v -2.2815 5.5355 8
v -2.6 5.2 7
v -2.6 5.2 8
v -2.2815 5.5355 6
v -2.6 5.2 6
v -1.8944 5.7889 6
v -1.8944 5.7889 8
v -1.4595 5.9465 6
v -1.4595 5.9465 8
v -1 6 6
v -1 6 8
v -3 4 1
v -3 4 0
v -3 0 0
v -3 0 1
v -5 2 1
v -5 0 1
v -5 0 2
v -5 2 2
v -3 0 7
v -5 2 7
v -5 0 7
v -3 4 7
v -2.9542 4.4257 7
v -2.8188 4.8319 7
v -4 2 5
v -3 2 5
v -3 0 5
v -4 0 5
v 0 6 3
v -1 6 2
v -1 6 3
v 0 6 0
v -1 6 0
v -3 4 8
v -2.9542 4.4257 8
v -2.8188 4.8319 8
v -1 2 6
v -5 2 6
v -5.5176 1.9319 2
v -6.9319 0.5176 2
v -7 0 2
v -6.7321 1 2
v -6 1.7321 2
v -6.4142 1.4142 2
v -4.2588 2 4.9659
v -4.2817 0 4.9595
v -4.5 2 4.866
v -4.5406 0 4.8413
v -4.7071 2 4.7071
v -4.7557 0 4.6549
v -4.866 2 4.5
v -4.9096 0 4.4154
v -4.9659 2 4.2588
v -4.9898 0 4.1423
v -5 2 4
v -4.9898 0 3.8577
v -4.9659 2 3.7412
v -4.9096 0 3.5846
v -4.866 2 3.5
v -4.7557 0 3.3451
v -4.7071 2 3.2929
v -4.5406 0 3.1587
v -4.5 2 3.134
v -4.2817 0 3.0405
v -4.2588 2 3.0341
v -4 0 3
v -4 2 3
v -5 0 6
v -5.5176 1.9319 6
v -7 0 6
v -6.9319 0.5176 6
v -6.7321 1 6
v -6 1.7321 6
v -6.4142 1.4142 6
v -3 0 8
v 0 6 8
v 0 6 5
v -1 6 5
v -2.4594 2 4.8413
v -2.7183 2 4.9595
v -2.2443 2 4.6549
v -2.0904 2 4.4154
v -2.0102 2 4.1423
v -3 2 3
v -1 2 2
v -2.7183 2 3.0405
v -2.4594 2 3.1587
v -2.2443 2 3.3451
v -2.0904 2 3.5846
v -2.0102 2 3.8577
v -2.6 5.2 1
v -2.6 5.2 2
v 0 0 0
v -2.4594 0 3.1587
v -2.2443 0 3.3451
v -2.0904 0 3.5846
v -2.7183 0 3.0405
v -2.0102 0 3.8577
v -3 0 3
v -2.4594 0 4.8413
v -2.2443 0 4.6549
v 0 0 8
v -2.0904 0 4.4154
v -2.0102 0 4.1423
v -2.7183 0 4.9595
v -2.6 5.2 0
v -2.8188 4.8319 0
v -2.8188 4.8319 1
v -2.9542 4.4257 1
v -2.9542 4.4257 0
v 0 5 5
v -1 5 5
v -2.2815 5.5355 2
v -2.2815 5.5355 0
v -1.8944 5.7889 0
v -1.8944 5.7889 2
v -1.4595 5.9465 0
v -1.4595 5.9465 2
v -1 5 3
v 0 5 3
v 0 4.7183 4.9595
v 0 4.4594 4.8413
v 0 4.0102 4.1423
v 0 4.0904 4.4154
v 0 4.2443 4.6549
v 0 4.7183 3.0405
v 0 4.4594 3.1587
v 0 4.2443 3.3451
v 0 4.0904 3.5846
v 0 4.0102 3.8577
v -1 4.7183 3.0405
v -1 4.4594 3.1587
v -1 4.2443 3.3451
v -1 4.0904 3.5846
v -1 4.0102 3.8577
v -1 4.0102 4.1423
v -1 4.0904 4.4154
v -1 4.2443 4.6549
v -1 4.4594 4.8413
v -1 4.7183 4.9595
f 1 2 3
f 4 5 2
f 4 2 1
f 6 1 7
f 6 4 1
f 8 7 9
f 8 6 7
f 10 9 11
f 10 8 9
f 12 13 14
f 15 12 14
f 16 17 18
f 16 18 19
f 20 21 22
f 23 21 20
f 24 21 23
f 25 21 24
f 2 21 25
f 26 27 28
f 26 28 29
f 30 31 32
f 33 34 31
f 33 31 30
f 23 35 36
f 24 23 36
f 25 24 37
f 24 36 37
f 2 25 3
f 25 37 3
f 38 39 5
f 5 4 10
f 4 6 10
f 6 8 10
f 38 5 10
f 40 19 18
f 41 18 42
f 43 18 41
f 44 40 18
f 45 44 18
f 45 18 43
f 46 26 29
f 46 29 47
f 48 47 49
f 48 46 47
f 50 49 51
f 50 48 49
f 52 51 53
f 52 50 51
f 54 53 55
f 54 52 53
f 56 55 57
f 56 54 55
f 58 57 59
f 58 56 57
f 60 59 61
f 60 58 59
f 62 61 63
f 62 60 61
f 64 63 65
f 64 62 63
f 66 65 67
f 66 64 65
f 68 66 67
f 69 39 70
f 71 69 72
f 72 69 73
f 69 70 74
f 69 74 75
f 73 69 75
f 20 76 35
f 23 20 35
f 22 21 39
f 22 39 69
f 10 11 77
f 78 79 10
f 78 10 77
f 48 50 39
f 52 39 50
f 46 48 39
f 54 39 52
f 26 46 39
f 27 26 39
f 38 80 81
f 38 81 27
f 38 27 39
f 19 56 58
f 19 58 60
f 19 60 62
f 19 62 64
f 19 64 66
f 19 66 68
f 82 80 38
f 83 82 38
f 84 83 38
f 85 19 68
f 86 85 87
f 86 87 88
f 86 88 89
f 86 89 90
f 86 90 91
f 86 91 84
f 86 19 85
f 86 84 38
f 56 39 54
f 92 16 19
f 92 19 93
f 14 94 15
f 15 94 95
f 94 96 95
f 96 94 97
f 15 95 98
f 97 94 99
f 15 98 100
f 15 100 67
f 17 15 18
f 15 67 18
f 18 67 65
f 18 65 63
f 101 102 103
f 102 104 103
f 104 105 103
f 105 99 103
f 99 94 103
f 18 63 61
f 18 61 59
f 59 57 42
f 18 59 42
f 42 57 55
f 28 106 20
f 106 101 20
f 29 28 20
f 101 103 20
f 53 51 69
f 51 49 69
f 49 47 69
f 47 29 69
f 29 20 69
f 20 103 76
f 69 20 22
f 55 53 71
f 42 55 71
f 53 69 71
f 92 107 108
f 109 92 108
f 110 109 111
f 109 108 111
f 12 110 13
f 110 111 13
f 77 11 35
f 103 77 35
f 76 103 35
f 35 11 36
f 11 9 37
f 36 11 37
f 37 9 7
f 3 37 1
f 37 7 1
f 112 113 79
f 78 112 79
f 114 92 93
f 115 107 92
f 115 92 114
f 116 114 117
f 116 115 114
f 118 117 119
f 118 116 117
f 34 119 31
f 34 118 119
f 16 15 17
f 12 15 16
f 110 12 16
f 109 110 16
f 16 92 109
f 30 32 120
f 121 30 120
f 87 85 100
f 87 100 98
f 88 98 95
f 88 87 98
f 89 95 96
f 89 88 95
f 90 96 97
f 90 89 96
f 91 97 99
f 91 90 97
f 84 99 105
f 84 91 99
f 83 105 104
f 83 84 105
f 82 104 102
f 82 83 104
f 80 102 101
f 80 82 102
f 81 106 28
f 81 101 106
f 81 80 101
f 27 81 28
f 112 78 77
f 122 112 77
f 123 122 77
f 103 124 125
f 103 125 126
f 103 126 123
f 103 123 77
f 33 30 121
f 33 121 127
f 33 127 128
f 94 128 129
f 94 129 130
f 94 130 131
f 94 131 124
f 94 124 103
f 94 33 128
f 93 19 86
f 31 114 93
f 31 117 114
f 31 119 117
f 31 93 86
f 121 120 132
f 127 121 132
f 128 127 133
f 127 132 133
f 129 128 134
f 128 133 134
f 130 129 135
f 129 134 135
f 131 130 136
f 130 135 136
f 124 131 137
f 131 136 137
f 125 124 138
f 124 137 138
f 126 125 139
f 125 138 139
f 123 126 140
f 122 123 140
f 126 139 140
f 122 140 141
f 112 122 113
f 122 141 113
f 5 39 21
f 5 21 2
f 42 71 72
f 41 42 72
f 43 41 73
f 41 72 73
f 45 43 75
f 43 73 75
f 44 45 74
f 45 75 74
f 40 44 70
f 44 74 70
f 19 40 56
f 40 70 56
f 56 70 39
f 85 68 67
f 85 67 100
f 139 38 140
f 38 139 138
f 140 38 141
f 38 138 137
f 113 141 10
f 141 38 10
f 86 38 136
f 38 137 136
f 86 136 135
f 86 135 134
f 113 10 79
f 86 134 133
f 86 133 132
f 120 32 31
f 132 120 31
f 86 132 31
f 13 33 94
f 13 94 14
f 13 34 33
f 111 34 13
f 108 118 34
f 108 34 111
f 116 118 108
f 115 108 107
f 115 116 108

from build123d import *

# Parameters (mm, degrees)
BOSS_EXTRUDE1_DEPTH = 8
SKETCH2_W           = 4
SKETCH2_H           = 4
CUT_EXTRUDE1_DEPTH  = 4
CUT_EXTRUDE2_DEPTH  = 2
BOSS_EXTRUDE2_DEPTH = 6
CUT_EXTRUDE4_DEPTH  = 2
CUT_EXTRUDE5_DEPTH  = 3
CUT_EXTRUDE8_DEPTH  = 1
CUT_EXTRUDE9_DEPTH  = 1


with BuildPart() as part:
    # Sketch1 → Boss-Extrude1 (new body)
    with BuildSketch(Plane.XY):
        with BuildLine():
            Line((0, 0), (-3, 0))
            Line((-3, 0), (-5, 0))
            Line((-5, 0), (-5, 2))
            Line((-5, 2), (-2.6, 5.2))
            ThreePointArc((-2.6, 5.2), (-1.894427191, 5.788854382), (-1, 6))
            Line((-1, 6), (0, 6))
            Line((0, 6), (0, 0))
        make_face()
    extrude(amount=BOSS_EXTRUDE1_DEPTH)

    # Sketch2 → Cut-Extrude1 (cut)
    with BuildSketch(Plane(origin=(0, 6, 0), x_dir=(1, 0, 0), z_dir=(0, 1, 0))):
        with Locations((-3, -4)):
            Rectangle(SKETCH2_W, SKETCH2_H)
    extrude(amount=-CUT_EXTRUDE1_DEPTH, mode=Mode.SUBTRACT)

    # Sketch3 → Cut-Extrude2 (cut, through all)
    with BuildSketch(Plane.ZY.offset(1)):
        with BuildLine():
            Line((3, 6), (3, 5))
            ThreePointArc((3, 5), (4, 4), (5, 5))
            Line((5, 5), (5, 6))
            Line((5, 6), (3, 6))
        make_face()
    extrude(amount=-CUT_EXTRUDE2_DEPTH, mode=Mode.SUBTRACT)

    # Sketch5 → Boss-Extrude2 (add)
    with BuildSketch(Plane.XY.offset(8)):
        with BuildLine():
            Line((-5, 0), (-7, 0))
            ThreePointArc((-7, 0), (-6.414213562, 1.414213562), (-5, 2))
            Line((-5, 2), (-5, 0))
        make_face()
    extrude(amount=-BOSS_EXTRUDE2_DEPTH)

    # Sketch6 → Cut-Extrude4 (cut)
    with BuildSketch(Plane.XY.offset(8)):
        with BuildLine():
            Line((-5, 2), (-5, 0))
            Line((-5, 0), (-7, 0))
            ThreePointArc((-7, 0), (-6.414213562, 1.414213562), (-5, 2))
        make_face()
    extrude(amount=-CUT_EXTRUDE4_DEPTH, mode=Mode.SUBTRACT)

    # Sketch7 → Cut-Extrude5 (cut, through all)
    with BuildSketch(Plane(origin=(0, 2, 0), x_dir=(1, 0, 0), z_dir=(0, 1, 0))):
        with BuildLine():
            Line((-4, -3), (-3, -3))
            ThreePointArc((-3, -3), (-2, -4), (-3, -5))
            Line((-3, -5), (-4, -5))
            ThreePointArc((-4, -5), (-5, -4), (-4, -3))
        make_face()
    extrude(amount=-CUT_EXTRUDE5_DEPTH, mode=Mode.SUBTRACT)

    # Sketch8 → Cut-Extrude8 (cut)
    with BuildSketch(Plane.XY.offset(8)):
        with BuildLine():
            Line((-5, 0), (-3, 0))
            Line((-3, 0), (-3, 4))
            ThreePointArc((-3, 4), (-2.897366596, 4.632455532), (-2.6, 5.2))
            Line((-2.6, 5.2), (-5, 2))
            Line((-5, 2), (-5, 0))
        make_face()
    extrude(amount=-CUT_EXTRUDE8_DEPTH, mode=Mode.SUBTRACT)

    # Sketch9 → Cut-Extrude9 (cut)
    with BuildSketch(Plane(origin=(0, 0, 0), x_dir=(-1, 0, 0), z_dir=(0, 0, -1))):
        with BuildLine():
            Line((5, 0), (5, 2))
            Line((5, 2), (2.6, 5.2))
            ThreePointArc((2.6, 5.2), (2.897366596, 4.632455532), (3, 4))
            Line((3, 4), (3, 0))
            Line((3, 0), (5, 0))
        make_face()
    extrude(amount=-CUT_EXTRUDE9_DEPTH, mode=Mode.SUBTRACT)


solid = part.part
